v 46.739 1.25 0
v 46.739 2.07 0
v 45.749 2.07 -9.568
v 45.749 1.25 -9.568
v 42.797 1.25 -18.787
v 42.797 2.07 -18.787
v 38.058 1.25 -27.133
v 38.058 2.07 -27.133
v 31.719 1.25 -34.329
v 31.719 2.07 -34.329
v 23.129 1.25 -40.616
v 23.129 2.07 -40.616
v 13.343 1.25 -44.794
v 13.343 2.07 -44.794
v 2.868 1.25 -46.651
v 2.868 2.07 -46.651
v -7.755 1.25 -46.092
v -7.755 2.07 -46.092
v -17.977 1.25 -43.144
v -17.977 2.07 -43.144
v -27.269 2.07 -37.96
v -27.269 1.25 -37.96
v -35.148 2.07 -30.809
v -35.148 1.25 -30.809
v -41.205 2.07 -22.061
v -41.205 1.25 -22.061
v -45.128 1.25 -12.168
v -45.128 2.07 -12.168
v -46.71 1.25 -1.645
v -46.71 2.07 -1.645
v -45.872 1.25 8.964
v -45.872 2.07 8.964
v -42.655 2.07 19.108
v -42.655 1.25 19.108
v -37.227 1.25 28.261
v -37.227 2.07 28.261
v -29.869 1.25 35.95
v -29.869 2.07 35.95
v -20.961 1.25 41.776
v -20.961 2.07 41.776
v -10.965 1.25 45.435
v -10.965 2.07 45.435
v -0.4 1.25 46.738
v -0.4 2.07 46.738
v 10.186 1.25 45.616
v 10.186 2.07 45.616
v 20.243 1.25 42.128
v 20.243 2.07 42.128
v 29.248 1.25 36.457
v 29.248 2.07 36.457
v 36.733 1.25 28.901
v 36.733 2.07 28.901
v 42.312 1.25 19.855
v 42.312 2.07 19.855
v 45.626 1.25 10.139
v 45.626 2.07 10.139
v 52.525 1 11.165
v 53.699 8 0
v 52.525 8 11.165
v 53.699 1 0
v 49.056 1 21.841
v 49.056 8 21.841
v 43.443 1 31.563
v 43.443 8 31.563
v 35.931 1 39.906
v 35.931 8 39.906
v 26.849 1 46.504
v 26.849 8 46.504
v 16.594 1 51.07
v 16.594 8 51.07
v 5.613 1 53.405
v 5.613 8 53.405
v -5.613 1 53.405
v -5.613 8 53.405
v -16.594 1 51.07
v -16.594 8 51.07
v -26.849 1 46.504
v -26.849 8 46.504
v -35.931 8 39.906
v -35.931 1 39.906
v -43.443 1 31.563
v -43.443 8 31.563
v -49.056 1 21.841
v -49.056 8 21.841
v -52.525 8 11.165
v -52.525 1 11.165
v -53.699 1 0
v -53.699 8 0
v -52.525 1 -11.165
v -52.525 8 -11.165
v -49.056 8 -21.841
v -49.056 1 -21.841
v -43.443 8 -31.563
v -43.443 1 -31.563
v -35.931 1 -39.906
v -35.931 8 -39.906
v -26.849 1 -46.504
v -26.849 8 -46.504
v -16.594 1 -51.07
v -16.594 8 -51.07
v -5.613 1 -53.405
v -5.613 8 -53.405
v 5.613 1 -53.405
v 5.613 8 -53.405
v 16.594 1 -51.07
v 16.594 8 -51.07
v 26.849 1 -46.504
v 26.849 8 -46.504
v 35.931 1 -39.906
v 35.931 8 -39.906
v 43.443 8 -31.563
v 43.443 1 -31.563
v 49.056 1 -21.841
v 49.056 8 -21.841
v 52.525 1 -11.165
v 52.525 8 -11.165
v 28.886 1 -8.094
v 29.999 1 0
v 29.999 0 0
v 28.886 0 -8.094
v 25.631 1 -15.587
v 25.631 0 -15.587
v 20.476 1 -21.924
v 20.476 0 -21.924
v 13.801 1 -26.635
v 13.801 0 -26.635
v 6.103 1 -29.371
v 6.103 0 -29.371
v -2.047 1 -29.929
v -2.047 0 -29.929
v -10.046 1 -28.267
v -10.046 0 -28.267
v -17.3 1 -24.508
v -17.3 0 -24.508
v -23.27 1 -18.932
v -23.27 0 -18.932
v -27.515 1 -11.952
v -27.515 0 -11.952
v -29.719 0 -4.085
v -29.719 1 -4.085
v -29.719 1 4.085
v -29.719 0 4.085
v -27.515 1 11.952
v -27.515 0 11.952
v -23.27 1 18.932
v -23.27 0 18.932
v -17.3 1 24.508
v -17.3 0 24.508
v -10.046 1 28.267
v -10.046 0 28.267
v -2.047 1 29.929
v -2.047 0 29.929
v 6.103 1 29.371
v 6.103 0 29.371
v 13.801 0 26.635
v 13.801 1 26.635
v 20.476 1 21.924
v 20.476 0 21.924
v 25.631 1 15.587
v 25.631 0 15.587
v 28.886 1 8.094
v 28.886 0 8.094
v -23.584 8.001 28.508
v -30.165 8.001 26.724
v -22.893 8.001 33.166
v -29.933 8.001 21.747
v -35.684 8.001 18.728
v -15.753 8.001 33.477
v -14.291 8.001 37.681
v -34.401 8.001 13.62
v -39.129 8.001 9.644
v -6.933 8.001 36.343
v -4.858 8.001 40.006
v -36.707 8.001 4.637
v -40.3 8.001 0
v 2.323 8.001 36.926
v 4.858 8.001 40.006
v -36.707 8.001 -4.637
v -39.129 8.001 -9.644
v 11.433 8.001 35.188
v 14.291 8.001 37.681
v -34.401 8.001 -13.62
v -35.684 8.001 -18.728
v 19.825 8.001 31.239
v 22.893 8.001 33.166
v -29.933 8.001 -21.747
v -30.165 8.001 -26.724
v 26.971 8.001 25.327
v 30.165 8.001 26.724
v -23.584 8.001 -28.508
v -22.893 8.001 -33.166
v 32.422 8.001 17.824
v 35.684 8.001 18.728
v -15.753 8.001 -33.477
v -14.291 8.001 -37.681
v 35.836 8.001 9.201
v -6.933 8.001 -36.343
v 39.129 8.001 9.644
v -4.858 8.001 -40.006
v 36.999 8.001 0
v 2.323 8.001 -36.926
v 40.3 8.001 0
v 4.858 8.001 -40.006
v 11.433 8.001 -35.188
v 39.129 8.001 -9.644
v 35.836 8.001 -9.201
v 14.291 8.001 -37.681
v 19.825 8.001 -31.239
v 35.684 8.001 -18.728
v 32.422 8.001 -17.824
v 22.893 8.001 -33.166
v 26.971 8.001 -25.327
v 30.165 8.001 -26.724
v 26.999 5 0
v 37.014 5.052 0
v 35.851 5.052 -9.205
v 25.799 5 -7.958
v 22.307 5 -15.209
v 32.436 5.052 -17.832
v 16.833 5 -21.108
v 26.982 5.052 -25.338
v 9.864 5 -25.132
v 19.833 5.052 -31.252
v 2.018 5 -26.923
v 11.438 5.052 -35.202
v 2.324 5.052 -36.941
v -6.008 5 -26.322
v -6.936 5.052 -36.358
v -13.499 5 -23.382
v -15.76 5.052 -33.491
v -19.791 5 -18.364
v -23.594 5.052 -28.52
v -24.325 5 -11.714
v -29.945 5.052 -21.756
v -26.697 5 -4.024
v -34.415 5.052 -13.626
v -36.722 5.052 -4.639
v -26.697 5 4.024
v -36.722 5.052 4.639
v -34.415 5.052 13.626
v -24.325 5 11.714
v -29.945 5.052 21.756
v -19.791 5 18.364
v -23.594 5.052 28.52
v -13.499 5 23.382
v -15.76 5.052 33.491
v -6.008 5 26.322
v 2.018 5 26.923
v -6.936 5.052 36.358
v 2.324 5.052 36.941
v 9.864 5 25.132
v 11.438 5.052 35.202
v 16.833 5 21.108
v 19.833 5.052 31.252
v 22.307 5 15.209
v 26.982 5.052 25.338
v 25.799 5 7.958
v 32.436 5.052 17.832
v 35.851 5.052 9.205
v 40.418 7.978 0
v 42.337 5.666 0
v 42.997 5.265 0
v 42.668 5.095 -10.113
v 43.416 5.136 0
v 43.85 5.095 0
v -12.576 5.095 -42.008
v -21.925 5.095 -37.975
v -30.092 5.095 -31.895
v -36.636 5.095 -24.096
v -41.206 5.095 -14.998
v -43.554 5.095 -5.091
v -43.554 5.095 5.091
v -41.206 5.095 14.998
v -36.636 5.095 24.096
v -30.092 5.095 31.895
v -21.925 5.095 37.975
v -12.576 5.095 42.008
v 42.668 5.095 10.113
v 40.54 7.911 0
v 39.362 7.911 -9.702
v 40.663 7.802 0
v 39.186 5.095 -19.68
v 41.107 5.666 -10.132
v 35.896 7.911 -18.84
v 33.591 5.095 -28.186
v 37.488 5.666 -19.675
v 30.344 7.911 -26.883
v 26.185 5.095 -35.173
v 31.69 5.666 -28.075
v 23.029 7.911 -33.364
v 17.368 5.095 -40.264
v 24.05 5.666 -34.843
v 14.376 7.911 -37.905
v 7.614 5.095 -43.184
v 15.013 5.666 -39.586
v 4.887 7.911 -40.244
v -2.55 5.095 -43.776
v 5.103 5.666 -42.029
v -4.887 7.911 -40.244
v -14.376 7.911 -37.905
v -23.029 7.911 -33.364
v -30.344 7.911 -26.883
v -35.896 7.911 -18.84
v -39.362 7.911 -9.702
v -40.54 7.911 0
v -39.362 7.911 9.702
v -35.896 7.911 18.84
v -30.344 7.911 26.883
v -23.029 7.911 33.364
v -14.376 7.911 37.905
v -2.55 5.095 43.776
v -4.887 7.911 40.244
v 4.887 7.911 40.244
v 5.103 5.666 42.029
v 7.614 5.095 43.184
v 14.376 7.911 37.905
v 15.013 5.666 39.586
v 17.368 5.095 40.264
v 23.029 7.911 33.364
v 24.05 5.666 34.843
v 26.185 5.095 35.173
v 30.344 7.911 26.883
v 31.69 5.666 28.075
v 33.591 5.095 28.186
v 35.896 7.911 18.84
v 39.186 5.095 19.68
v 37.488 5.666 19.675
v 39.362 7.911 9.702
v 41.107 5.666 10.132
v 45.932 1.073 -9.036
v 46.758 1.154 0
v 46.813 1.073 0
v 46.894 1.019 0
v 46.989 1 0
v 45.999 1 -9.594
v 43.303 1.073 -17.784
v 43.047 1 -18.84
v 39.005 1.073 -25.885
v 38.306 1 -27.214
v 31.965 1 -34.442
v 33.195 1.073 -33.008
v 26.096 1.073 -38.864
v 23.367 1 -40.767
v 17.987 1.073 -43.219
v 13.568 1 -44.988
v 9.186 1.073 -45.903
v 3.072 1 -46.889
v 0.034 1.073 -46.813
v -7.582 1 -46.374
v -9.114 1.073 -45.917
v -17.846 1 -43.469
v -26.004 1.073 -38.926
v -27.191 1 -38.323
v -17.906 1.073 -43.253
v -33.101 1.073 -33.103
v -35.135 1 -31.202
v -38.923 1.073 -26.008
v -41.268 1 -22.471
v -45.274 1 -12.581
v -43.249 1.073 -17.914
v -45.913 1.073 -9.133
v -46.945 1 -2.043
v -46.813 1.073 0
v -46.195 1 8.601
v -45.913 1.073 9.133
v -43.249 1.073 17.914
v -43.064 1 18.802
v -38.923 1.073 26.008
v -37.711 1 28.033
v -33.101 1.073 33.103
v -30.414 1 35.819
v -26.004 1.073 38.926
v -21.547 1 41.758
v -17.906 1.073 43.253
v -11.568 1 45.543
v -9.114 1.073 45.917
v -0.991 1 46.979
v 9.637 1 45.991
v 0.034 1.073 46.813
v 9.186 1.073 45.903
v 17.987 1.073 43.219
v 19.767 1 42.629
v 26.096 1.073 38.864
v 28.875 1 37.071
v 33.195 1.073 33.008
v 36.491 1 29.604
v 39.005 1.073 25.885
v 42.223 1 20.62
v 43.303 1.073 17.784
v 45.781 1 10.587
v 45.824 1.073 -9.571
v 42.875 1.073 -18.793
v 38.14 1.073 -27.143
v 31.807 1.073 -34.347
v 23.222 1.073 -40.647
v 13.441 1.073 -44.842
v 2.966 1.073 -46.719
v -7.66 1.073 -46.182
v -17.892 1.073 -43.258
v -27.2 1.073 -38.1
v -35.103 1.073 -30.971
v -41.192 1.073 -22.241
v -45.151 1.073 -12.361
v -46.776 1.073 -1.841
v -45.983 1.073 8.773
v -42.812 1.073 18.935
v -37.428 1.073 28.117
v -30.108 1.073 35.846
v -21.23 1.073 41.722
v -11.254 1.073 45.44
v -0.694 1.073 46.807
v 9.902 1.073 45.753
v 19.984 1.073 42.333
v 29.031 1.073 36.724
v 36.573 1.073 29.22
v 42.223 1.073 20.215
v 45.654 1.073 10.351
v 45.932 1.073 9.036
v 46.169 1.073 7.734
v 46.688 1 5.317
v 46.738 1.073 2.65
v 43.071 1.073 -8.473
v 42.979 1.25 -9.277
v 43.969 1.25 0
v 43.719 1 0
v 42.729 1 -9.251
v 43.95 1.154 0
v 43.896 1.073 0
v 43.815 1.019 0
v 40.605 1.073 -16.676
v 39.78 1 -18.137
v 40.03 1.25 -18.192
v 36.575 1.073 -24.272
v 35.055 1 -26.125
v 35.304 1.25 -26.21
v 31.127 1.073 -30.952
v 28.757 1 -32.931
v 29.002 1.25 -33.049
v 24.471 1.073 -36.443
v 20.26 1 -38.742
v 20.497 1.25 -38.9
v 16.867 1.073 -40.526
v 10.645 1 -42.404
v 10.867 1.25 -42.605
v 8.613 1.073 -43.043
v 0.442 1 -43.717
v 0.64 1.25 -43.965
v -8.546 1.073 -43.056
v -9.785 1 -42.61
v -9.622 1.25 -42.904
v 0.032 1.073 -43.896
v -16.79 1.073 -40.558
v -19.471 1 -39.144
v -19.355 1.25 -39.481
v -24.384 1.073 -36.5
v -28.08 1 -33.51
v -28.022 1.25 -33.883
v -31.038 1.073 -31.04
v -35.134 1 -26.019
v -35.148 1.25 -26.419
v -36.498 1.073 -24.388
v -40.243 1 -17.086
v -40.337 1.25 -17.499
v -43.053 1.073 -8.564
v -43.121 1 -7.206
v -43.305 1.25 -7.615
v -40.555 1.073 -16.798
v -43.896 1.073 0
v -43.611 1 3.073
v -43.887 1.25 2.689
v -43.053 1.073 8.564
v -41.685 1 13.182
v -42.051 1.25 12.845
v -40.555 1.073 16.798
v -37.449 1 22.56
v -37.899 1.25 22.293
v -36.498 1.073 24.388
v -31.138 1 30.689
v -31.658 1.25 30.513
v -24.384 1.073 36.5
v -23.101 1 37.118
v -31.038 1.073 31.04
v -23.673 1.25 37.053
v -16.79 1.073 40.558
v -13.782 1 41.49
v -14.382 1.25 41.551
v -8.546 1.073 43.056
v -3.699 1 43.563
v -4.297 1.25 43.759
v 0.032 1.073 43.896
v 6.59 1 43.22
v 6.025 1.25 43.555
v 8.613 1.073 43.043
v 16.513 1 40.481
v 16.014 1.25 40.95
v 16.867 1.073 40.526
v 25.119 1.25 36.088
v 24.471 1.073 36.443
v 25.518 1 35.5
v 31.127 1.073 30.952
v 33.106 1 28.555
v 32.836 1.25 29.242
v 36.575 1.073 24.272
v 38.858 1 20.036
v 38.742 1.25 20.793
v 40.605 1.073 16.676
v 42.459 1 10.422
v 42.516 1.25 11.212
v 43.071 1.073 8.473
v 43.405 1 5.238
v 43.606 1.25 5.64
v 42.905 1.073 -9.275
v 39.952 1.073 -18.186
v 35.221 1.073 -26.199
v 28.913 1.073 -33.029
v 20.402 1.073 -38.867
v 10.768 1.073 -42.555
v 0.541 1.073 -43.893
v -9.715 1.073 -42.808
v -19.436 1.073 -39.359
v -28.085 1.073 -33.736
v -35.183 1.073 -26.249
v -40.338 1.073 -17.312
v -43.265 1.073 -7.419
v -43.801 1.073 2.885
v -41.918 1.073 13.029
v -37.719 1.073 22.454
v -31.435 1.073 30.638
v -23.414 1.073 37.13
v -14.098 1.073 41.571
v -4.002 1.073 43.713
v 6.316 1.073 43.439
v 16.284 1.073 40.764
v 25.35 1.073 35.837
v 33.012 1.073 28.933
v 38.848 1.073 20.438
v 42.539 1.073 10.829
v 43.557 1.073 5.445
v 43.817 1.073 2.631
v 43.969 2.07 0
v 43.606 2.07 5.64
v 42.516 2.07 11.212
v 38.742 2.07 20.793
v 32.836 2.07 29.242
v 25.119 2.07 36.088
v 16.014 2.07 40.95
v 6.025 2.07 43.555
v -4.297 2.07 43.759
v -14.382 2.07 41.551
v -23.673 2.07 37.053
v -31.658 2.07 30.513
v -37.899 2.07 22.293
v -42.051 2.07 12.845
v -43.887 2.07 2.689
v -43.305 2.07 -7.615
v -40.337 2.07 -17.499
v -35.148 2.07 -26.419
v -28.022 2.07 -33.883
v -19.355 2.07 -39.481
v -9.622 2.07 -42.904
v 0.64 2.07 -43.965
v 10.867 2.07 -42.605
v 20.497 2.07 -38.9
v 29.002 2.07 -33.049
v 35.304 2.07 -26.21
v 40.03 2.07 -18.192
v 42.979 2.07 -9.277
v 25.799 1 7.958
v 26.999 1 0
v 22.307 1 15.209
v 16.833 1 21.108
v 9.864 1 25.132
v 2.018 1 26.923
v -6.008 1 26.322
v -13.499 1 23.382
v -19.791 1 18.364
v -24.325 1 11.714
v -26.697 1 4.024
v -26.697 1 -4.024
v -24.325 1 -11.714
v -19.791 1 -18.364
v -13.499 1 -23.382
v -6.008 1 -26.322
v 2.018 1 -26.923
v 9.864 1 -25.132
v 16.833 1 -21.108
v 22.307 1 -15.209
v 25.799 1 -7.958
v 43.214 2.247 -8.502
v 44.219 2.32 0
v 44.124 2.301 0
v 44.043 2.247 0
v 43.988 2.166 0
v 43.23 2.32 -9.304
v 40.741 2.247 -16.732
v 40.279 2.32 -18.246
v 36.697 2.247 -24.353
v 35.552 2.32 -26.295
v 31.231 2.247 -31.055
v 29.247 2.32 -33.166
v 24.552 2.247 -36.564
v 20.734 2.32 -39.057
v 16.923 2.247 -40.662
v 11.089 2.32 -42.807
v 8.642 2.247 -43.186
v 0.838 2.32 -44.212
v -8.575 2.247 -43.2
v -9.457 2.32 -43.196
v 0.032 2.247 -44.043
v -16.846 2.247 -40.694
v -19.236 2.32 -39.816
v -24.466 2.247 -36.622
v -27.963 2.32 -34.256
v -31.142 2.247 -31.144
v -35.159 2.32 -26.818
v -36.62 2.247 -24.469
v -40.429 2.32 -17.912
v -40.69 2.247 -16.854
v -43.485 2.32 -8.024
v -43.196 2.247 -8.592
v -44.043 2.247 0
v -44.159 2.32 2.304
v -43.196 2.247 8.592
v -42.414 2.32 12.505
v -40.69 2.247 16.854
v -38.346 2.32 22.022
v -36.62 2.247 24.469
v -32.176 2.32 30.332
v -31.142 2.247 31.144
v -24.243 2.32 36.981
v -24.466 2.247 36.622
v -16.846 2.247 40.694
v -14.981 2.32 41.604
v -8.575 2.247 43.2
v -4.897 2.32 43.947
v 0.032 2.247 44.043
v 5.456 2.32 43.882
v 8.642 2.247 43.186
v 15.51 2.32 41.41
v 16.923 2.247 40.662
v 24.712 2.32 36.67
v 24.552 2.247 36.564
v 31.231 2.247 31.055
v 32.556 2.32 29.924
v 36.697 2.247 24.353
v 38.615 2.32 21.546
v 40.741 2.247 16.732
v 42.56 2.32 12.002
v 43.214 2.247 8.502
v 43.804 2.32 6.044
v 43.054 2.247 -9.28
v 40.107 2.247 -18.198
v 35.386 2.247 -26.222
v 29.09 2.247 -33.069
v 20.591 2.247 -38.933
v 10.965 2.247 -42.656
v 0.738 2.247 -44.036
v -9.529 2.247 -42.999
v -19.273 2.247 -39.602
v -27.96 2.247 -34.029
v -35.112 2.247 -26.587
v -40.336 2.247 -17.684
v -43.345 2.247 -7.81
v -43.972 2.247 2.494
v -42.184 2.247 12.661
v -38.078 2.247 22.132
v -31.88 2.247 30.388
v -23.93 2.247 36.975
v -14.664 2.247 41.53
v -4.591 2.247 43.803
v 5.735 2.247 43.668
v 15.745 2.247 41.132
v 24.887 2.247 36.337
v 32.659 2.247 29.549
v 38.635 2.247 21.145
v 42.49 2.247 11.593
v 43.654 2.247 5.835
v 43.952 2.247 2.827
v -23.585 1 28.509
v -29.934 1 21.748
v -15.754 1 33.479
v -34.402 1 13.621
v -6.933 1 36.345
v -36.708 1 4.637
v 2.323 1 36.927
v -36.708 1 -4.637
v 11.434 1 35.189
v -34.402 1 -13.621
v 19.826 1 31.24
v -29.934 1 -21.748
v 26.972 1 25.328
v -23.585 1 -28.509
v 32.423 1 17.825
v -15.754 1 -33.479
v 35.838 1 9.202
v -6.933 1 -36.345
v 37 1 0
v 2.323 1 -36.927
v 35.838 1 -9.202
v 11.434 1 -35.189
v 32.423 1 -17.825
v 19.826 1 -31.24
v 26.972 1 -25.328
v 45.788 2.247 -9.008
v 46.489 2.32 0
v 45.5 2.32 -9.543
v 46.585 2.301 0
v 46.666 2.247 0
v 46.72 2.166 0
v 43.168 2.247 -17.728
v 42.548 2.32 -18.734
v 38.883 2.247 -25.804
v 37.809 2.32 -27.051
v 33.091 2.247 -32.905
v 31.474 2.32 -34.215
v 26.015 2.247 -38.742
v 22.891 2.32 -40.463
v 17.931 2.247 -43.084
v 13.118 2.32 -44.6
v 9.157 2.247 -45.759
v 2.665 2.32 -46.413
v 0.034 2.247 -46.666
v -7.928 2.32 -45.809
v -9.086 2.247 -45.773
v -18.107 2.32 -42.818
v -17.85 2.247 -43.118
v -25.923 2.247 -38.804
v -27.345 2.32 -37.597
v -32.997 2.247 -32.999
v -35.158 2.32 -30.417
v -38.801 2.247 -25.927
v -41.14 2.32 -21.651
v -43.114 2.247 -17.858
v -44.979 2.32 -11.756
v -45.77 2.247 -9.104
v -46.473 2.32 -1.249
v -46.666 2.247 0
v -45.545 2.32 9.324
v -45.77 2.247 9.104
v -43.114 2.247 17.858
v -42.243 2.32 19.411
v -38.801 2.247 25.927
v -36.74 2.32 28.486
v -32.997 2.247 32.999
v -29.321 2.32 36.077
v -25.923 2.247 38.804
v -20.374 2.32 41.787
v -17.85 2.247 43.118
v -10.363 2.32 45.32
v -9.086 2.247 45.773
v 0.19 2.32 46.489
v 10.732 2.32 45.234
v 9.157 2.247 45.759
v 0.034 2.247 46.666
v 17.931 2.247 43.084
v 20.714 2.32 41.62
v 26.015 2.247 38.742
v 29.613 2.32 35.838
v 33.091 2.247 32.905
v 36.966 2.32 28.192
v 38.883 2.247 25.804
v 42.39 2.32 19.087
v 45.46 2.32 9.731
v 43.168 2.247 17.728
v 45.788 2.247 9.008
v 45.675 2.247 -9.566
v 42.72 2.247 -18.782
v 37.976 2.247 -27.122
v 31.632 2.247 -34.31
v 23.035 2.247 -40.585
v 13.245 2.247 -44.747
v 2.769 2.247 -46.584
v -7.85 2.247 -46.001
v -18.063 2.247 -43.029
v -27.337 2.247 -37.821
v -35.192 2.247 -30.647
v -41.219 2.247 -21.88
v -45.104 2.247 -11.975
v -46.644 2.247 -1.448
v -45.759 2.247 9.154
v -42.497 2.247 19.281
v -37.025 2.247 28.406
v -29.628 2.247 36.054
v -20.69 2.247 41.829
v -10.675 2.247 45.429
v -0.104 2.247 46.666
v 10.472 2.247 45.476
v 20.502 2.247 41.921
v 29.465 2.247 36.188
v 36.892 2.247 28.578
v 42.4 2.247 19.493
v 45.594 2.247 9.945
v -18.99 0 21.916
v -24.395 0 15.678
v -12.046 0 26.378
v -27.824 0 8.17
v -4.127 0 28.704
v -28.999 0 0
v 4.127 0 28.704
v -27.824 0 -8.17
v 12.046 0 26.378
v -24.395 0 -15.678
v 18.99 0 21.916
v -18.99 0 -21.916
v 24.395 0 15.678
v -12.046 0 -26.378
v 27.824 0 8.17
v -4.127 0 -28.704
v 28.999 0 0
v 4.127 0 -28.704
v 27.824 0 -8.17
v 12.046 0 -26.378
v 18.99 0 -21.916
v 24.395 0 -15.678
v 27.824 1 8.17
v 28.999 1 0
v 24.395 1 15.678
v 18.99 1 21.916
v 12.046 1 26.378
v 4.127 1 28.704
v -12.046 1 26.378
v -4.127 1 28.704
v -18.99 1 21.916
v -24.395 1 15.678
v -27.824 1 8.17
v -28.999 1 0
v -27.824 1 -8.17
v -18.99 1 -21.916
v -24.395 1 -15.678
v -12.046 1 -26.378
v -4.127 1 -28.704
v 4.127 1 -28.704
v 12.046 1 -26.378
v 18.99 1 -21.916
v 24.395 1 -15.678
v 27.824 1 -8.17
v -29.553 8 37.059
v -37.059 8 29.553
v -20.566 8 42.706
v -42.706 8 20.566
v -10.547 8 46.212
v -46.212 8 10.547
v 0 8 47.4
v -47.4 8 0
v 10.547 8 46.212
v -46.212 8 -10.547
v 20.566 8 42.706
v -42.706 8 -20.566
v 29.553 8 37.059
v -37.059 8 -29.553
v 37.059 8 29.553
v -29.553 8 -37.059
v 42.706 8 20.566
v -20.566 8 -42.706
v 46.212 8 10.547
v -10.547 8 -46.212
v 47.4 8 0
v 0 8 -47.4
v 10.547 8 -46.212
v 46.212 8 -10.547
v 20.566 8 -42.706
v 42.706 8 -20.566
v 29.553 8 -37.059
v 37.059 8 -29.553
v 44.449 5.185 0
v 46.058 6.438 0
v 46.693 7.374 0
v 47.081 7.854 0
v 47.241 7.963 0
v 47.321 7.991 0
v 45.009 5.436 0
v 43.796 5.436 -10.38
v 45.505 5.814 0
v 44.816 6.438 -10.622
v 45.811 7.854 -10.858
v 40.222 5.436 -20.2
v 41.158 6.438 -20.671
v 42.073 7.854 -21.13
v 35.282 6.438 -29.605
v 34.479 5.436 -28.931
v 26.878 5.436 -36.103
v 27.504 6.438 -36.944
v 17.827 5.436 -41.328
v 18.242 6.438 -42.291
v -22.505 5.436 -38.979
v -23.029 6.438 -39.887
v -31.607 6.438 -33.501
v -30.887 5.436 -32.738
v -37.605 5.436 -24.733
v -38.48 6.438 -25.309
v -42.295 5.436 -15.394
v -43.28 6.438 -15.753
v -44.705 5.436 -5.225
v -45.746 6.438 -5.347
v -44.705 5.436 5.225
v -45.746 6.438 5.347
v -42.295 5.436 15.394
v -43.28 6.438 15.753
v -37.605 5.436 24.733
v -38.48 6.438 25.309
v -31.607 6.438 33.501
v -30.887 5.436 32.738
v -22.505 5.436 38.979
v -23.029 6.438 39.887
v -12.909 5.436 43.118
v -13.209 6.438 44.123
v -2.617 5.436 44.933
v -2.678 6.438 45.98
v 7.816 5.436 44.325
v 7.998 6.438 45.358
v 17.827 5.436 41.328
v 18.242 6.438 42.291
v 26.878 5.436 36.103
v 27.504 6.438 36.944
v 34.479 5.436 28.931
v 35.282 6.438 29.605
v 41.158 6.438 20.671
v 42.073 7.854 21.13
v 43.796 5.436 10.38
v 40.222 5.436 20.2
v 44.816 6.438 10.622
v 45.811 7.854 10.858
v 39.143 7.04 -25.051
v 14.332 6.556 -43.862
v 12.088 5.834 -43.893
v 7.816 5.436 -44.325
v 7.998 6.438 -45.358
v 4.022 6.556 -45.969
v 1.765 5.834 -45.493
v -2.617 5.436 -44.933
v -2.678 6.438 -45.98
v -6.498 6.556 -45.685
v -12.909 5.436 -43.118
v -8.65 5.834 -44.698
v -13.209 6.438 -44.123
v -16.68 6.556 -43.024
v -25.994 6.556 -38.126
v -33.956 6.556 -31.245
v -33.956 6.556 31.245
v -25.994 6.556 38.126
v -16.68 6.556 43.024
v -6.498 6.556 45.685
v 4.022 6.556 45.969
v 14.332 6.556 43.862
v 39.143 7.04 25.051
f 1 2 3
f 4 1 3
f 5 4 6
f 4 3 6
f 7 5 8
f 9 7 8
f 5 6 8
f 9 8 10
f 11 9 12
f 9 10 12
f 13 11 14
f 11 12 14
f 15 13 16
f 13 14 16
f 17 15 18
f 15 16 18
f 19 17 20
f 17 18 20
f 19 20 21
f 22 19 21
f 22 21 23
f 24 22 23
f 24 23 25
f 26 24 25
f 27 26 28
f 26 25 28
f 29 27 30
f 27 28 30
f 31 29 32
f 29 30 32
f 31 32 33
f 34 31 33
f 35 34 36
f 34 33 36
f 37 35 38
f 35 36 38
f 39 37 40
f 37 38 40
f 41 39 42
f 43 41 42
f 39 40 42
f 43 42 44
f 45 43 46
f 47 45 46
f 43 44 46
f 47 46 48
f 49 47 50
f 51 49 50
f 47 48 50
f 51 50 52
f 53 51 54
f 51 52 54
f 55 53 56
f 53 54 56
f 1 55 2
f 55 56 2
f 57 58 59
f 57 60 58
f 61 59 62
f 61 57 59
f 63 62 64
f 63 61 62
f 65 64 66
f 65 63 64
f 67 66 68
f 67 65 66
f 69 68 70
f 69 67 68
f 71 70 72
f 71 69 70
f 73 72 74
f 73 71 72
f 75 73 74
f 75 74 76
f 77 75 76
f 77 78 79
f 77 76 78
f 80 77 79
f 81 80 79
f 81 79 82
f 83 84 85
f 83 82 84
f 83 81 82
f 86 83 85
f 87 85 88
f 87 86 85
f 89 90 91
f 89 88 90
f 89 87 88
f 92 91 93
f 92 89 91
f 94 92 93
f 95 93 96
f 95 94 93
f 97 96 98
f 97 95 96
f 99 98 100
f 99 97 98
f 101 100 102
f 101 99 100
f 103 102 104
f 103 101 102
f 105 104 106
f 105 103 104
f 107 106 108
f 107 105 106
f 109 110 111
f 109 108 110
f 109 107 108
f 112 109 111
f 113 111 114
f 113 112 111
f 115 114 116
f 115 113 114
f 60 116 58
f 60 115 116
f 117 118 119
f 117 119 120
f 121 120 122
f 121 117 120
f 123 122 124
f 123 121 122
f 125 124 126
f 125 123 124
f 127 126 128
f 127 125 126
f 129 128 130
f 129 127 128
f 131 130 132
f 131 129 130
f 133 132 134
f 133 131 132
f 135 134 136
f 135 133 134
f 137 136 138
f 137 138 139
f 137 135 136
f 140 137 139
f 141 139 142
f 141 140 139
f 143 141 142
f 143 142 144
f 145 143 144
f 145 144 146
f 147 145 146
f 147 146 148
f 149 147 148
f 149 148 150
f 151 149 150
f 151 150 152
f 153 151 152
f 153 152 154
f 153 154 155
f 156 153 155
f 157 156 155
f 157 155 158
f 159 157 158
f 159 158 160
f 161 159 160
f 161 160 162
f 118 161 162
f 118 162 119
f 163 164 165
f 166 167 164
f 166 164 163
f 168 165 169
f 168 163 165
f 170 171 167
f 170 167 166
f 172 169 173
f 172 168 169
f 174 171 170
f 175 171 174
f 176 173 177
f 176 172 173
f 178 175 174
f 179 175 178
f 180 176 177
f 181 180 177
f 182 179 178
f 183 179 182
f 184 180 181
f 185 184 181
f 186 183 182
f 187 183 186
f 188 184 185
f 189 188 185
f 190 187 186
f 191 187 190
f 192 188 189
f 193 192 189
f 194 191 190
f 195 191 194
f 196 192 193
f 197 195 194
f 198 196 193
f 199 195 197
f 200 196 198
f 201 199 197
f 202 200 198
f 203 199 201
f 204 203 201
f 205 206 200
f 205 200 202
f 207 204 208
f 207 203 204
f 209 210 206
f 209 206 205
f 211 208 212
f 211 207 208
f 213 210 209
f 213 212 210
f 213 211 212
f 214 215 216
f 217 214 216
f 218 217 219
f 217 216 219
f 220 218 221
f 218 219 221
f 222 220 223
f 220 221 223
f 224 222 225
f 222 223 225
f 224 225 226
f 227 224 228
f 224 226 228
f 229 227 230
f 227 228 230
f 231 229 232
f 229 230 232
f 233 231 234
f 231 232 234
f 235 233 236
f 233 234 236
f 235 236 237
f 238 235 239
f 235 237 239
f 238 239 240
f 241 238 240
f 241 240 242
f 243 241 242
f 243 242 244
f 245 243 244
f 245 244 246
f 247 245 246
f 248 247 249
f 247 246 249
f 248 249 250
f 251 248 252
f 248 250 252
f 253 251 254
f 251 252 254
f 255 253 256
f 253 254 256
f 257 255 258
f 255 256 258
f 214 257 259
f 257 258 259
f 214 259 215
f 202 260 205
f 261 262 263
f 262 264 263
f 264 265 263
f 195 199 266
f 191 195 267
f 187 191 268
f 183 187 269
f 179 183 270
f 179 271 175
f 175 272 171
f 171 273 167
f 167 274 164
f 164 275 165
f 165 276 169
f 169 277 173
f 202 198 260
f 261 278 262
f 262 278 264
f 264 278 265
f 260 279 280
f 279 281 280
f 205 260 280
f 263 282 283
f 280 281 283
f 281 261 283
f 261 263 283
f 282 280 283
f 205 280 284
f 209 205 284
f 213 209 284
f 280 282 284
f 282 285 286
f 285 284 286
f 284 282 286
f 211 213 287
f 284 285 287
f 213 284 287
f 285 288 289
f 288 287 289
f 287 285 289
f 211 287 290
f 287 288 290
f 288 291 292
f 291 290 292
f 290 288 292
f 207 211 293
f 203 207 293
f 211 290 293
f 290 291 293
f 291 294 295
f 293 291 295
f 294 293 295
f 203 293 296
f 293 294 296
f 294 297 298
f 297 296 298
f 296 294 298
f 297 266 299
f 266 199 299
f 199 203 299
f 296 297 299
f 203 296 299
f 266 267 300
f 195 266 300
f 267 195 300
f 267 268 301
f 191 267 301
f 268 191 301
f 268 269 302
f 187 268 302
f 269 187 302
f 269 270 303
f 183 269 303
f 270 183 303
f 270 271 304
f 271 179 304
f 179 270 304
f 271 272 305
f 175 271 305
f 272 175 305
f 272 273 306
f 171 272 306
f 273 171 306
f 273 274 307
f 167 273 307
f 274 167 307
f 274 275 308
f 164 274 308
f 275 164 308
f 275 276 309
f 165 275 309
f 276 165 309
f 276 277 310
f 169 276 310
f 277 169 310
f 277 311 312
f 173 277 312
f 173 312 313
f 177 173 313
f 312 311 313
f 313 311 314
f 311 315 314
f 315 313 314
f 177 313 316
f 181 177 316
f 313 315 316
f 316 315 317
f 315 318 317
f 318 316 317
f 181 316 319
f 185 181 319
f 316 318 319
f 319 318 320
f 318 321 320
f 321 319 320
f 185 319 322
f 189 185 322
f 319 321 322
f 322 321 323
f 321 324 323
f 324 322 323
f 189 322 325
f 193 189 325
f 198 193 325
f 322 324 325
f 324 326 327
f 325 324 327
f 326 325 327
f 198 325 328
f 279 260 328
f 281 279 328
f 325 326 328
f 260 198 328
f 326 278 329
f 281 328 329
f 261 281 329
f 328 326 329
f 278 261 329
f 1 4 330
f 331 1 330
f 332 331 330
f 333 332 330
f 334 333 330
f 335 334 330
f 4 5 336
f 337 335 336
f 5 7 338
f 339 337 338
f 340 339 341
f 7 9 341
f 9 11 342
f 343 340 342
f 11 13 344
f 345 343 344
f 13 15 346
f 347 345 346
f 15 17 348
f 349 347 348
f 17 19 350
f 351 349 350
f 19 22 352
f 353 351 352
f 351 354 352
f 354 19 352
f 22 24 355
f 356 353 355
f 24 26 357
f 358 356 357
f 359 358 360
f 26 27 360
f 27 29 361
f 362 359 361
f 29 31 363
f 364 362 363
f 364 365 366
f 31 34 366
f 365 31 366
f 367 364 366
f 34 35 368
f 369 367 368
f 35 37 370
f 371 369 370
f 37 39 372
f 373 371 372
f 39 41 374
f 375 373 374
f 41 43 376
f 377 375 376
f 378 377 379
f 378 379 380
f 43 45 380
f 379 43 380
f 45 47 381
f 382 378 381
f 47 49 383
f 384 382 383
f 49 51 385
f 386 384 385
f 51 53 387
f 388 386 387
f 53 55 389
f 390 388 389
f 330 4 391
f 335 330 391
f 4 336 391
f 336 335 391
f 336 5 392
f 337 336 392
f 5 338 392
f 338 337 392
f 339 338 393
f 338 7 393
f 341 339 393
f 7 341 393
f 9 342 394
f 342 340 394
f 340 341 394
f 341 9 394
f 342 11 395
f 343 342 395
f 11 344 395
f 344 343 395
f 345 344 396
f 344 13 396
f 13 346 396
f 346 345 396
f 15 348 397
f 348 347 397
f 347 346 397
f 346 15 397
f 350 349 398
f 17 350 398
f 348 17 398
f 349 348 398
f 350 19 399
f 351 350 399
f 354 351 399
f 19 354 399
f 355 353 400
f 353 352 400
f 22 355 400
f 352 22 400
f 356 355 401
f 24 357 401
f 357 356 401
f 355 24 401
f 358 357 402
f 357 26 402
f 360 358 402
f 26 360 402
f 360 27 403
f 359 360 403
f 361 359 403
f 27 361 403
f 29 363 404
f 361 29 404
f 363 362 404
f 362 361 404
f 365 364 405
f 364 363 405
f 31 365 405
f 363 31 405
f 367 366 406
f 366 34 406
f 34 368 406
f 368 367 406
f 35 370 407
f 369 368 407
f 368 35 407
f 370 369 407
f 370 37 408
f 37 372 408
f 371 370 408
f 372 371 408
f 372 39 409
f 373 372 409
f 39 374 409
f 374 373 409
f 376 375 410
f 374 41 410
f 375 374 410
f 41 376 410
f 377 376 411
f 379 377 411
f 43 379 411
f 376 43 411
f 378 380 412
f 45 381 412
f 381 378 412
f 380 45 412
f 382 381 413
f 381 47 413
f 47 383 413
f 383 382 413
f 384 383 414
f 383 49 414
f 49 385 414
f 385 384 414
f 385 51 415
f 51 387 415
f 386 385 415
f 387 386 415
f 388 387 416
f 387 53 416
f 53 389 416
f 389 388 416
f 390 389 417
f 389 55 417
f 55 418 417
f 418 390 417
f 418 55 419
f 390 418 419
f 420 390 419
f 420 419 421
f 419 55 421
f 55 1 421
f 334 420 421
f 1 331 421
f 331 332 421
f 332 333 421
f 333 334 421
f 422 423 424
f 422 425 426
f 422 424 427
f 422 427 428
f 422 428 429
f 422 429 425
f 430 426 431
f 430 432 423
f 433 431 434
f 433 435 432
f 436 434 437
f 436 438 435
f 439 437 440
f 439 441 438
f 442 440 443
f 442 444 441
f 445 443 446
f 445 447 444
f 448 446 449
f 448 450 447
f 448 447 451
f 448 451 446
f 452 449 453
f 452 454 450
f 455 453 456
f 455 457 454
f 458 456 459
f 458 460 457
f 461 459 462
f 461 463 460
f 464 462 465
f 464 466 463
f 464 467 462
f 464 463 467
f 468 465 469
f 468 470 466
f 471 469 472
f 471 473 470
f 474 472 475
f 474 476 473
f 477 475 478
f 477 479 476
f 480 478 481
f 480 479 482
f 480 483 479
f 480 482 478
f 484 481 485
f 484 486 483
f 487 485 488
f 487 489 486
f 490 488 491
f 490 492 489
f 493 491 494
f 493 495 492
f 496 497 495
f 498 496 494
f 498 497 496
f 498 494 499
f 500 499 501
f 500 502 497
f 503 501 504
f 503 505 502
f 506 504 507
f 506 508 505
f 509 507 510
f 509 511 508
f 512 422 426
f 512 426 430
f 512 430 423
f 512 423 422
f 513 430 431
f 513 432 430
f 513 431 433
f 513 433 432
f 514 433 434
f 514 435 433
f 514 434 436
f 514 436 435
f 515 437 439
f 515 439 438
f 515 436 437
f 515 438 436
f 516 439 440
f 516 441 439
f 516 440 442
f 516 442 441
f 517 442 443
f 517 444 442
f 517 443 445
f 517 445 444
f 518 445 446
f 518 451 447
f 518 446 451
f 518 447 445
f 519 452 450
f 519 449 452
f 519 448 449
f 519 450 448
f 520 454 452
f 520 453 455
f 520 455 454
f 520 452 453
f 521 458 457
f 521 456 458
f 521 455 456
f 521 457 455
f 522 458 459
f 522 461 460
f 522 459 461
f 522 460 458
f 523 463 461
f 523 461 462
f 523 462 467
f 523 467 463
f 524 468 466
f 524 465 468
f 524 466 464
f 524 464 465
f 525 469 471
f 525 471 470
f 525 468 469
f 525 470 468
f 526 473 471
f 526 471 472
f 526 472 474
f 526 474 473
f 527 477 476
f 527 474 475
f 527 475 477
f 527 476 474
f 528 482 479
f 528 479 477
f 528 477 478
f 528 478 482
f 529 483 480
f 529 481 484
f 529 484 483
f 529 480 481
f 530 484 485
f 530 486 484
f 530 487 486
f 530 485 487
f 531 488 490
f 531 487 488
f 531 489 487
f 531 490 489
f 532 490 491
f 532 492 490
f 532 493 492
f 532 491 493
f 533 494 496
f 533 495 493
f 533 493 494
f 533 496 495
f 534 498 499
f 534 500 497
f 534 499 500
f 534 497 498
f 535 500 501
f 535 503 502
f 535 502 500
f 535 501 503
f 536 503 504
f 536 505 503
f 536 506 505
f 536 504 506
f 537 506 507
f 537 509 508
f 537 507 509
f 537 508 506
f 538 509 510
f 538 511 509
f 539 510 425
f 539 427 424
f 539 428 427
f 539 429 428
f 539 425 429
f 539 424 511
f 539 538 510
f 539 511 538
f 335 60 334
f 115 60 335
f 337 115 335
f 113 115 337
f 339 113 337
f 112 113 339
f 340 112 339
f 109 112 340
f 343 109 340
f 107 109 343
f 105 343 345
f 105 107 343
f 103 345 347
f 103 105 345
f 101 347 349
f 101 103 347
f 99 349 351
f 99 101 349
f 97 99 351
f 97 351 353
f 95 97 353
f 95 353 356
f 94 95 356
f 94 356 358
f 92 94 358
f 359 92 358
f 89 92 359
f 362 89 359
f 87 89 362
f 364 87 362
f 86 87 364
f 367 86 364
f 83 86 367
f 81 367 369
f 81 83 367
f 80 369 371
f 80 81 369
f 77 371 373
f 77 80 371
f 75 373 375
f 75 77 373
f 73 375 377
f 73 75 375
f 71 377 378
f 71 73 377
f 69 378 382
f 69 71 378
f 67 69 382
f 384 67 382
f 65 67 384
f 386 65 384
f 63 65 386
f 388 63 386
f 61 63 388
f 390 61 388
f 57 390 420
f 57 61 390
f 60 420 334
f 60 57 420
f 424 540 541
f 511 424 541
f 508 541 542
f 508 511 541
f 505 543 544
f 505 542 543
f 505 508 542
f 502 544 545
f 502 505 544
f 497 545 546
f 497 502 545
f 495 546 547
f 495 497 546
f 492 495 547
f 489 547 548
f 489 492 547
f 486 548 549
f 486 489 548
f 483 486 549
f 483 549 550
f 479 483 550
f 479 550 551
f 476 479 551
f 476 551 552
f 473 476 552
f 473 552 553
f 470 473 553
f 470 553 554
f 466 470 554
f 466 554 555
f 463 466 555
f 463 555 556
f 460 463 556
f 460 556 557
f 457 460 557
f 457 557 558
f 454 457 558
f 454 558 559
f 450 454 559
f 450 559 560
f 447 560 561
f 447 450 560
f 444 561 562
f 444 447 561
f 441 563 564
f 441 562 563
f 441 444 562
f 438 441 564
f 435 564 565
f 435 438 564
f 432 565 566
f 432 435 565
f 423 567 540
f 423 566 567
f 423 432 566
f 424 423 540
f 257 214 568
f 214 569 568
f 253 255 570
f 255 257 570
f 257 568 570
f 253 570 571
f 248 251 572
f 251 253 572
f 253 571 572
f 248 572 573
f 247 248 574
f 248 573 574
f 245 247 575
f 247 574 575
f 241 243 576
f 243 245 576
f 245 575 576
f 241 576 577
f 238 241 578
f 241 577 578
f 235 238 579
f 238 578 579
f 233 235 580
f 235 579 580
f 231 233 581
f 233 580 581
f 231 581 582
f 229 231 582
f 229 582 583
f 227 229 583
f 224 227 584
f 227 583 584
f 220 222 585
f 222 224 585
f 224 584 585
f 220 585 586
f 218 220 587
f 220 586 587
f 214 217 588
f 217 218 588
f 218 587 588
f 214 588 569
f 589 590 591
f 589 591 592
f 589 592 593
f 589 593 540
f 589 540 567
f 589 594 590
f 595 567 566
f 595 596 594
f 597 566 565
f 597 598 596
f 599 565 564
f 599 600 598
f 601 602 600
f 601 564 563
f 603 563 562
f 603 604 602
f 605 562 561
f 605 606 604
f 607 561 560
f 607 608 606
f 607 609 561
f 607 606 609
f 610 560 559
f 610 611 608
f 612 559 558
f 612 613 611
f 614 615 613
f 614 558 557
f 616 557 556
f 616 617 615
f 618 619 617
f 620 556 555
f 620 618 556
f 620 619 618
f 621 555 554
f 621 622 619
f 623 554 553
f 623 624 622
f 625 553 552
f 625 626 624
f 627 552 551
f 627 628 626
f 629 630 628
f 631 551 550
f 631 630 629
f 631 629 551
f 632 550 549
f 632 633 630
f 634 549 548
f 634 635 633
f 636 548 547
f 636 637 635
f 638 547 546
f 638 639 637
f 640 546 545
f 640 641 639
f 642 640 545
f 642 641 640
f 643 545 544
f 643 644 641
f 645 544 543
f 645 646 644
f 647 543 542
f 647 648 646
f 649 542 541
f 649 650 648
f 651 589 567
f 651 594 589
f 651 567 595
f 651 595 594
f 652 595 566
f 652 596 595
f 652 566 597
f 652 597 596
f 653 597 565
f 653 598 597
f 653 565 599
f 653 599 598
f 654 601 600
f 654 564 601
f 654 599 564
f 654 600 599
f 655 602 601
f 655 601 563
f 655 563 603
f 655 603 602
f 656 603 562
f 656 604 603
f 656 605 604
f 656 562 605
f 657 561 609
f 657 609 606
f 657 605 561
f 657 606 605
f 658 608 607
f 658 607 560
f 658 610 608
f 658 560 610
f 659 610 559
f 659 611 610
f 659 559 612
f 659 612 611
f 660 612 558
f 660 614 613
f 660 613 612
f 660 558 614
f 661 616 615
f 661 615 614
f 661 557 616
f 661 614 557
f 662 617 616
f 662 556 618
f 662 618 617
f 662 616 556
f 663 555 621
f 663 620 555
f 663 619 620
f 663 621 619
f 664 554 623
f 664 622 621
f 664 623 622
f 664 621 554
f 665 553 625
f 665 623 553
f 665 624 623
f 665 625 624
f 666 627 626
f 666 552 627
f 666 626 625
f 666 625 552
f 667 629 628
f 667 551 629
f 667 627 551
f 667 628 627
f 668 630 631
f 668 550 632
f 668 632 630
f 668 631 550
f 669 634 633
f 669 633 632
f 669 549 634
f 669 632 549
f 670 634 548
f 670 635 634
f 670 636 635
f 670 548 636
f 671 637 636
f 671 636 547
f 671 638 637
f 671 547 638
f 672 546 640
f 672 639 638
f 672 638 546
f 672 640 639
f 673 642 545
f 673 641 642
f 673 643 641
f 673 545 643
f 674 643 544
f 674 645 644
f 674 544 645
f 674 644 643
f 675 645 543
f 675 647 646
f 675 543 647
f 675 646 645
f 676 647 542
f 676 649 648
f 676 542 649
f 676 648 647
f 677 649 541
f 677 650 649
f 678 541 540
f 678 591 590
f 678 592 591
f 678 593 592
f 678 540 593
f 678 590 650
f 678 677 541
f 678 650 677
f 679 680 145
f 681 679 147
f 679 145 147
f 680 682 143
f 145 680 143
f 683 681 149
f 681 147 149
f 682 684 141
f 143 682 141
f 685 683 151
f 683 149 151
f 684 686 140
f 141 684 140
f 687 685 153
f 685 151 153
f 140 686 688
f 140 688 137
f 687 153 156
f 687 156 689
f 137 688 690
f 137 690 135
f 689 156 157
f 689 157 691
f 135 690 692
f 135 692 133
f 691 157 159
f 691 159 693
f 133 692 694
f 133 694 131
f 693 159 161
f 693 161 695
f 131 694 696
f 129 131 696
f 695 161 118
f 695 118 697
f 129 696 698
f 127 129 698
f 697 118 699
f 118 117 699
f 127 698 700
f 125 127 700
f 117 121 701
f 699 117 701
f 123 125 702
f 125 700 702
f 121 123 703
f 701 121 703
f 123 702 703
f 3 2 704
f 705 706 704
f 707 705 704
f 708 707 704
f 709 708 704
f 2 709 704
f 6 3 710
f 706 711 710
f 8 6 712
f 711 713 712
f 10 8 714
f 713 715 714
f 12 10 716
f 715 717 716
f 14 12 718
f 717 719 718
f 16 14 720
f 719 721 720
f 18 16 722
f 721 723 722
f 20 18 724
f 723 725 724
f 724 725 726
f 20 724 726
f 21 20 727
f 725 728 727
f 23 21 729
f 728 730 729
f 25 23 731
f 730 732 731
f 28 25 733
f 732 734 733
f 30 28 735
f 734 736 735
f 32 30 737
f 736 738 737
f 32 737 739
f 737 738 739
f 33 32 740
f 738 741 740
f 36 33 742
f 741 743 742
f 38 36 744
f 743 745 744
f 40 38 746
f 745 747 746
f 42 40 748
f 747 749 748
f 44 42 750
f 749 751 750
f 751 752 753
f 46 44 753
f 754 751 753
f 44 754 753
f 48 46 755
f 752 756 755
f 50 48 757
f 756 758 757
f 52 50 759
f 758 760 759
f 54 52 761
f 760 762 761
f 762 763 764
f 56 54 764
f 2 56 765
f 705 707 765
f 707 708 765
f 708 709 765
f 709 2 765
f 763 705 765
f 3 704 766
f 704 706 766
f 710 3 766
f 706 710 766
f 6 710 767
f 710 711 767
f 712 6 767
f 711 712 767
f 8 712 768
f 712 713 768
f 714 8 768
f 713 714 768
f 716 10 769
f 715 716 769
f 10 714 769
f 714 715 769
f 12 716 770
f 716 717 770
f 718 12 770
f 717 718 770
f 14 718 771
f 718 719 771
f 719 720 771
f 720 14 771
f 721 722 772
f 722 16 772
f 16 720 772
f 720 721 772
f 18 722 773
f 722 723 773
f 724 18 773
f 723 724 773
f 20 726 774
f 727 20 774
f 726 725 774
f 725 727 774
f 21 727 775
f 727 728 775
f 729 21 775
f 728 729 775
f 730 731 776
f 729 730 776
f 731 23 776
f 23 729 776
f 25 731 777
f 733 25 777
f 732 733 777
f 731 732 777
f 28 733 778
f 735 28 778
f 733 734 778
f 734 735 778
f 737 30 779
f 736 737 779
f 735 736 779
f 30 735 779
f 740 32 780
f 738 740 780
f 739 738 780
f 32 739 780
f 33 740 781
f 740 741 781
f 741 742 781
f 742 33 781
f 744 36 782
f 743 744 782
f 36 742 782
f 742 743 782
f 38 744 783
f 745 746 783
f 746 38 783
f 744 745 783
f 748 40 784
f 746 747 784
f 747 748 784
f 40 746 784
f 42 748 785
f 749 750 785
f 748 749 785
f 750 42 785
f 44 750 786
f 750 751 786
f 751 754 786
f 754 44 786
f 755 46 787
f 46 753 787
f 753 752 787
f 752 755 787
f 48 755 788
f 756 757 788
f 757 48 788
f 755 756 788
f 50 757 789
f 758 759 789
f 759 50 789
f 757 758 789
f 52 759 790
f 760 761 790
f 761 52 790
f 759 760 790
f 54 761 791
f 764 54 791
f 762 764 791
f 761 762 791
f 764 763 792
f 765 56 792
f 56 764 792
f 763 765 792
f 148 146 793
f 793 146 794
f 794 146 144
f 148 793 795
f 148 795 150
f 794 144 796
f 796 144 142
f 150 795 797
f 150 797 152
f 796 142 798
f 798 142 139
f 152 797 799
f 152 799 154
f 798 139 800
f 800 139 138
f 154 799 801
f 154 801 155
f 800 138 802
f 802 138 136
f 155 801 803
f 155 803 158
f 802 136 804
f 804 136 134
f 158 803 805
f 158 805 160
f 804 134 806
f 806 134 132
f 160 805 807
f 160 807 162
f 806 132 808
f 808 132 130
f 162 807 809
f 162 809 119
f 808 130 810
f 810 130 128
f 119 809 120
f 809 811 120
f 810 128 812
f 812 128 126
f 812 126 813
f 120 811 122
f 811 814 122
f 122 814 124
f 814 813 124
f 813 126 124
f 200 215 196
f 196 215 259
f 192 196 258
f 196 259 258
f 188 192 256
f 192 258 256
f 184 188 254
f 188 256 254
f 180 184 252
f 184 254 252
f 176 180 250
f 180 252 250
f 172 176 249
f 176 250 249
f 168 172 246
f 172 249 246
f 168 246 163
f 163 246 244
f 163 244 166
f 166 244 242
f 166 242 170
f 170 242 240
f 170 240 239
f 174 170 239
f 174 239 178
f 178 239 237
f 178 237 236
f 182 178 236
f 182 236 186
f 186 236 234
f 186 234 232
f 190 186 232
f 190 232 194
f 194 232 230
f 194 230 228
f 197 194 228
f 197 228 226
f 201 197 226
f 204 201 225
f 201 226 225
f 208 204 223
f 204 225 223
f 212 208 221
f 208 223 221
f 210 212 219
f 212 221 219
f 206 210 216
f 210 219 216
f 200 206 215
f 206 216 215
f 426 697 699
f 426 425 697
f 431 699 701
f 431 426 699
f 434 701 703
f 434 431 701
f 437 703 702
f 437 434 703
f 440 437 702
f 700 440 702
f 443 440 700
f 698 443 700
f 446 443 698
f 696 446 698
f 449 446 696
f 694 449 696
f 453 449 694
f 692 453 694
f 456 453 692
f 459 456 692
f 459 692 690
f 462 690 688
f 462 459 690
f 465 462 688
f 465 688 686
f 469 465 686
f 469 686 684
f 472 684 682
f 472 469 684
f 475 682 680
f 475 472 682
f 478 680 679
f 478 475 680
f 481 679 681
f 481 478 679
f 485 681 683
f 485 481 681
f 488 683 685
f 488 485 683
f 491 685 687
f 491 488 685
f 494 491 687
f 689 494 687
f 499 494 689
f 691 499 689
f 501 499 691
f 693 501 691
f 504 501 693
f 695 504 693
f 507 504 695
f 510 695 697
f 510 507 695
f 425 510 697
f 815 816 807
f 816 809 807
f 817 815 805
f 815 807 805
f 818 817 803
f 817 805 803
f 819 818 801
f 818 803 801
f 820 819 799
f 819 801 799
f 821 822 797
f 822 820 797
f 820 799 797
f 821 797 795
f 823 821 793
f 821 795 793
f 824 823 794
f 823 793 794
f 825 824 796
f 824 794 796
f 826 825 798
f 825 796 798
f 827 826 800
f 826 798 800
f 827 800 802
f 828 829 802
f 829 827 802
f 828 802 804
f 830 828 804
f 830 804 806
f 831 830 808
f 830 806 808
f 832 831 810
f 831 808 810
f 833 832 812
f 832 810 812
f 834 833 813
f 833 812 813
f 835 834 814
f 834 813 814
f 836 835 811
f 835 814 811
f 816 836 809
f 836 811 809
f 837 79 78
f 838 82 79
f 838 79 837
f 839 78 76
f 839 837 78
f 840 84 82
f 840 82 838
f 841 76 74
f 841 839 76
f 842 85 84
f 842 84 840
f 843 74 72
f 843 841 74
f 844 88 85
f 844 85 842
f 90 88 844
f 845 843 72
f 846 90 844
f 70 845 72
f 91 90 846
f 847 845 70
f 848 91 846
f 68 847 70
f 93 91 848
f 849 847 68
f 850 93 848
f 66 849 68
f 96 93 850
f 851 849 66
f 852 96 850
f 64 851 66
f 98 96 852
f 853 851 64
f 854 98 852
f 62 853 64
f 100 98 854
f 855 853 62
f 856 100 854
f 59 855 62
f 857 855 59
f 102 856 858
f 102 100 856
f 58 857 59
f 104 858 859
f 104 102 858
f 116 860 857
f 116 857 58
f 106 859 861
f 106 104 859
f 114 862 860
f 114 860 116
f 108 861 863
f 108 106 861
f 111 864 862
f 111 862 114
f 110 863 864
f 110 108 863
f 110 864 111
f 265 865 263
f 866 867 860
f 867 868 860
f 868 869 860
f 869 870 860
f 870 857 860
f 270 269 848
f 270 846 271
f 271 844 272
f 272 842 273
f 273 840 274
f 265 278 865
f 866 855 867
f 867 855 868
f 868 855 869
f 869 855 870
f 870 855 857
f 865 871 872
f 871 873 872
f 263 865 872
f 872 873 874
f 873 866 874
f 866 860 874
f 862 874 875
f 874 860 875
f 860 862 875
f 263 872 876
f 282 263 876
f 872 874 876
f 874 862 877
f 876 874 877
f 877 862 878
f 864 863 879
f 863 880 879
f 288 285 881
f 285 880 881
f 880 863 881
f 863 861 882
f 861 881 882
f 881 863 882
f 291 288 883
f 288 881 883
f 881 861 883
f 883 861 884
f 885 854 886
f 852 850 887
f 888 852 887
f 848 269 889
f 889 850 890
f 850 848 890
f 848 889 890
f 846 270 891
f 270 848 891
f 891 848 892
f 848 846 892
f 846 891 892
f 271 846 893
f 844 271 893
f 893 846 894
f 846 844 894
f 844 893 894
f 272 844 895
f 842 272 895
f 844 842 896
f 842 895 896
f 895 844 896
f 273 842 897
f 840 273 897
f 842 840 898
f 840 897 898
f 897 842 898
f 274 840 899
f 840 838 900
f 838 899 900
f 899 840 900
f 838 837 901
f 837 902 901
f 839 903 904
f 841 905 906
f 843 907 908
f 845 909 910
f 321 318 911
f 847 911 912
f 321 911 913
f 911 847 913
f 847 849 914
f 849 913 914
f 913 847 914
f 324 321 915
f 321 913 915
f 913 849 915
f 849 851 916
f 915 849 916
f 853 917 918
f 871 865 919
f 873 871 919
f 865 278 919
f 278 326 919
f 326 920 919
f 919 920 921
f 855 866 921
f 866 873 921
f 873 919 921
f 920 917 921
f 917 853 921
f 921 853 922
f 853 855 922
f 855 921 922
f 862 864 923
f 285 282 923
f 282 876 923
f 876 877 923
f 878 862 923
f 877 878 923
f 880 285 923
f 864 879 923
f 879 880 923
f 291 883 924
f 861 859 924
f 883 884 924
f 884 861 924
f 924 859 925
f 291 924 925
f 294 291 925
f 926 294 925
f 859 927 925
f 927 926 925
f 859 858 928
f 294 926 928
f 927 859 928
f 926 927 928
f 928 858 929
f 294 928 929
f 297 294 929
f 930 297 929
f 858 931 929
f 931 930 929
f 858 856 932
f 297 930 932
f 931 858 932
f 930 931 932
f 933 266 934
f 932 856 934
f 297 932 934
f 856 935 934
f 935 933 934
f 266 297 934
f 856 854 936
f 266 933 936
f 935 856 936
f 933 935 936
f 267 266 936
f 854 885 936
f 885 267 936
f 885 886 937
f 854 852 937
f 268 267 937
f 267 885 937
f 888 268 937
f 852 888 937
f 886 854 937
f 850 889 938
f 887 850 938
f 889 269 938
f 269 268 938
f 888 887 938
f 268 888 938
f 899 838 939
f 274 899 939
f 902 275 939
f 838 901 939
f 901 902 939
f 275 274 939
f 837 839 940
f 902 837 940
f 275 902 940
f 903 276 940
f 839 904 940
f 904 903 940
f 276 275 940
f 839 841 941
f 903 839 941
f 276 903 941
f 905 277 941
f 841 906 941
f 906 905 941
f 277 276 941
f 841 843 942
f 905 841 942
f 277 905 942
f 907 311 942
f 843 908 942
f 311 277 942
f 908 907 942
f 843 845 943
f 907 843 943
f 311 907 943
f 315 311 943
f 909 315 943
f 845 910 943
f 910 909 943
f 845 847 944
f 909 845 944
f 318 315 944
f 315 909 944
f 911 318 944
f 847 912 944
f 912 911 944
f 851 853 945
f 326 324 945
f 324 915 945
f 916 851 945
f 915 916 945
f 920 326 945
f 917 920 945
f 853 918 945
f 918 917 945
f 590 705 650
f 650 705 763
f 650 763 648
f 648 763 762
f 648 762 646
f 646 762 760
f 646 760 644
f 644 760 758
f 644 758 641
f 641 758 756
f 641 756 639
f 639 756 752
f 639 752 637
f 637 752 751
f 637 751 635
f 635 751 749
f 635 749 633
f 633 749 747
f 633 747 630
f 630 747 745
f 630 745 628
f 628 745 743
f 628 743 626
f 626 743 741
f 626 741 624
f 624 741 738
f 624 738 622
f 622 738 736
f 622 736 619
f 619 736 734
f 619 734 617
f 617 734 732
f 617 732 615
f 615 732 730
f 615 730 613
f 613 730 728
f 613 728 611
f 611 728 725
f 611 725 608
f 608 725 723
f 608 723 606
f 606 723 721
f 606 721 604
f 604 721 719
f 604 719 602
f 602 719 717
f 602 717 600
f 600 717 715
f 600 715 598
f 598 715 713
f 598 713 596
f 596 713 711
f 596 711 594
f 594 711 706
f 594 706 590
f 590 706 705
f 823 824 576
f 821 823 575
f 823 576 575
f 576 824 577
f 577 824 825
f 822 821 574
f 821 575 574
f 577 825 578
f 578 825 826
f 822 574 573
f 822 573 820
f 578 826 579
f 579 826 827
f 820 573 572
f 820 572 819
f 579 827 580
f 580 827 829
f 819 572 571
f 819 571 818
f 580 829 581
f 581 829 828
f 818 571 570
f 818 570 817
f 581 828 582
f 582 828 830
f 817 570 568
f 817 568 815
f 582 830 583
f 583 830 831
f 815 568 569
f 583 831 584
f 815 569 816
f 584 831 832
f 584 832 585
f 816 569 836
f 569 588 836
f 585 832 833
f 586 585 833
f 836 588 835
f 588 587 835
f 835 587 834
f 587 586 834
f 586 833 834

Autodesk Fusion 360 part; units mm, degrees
sketch "Sketch1" plane through (0, 0, 0) normal (0, 0, 1) x (1, 0, 0)
  spline S0 degree 5 poles (40.3, 8.0005) (40.3854, 8.0005) (40.5575, 7.9418) (40.8197, 7.6776) (41.2001, 7.0315) (41.8406, 6.0459) (42.7193, 5.2457) (43.8506, 4.9398) (44.9792, 5.2641) (45.8516, 6.0676) (46.4866, 7.0454) (46.8672, 7.6822) (47.134, 7.9422) (47.3114, 8) (47.4, 8) knots 0 0 0 0 0 0 0.1 0.2 0.3 0.4 0.5 0.6 0.7 0.8 0.9 1 1 1 1 1 1
  line L0 (40.3, 8.0005) -> (36.9987, 8.0005)
  line L1 (47.4, 8) -> (53.6987, 8)
  line L2 (47.1403, 8) -> (47.6598, 8)
  line L3 (40.0497, 8.0005) -> (40.5503, 8.0005)
  line L4 (53.6987, 8) -> (53.6987, 1.0001)
  line L5 (43.2, 5.0899) -> (44.5, 5.1)
  line L6 (46.7394, 0.9997) -> (46.7394, 2.3197)
  line L7 (46.7394, 2.3197) -> (43.9694, 2.3205)
  line L8 (43.9694, 2.3205) -> (43.9694, 1.0001)
  line L9 (37, 1) -> (43.9694, 1.0001)
  line L10 (46.7394, 0.9997) -> (53.6987, 1.0001)
  line L11 (36.9987, 8.0005) -> (37.0139, 5.0519)
  line L12 (37.0139, 5.0519) -> (26.9987, 5.0003)
  line L13 (26.9987, 5.0003) -> (26.9987, 1)
  line L14 (26.9987, 1) -> (28.9987, 1)
  line L15 (28.9987, 1) -> (28.9987, 0)
  line L16 (28.9987, 0) -> (29.9987, 0)
  line L17 (29.9987, 0) -> (29.9987, 1)
  line L18 (29.9987, 1) -> (37, 1)
  point P0 (43.85, 5.095)
  dimension "d4" = 16.7
  dimension "d19" = 1.32
  dimension "d20" = 2.77
  dimension "d30" = 2
  dimension "d31" = 1
  dimension "d32" = 1
revolve "Revolve1" add sketch "Sketch1" angle 360 about axis through (0, 1.75, 0) along (0, 1, 0)
fillet "Fillet1" radius 0.25 1 edges at (-40.9938, 2.3205, -15.9)
fillet "Fillet2" radius 0.25 1 edges at (-43.5764, 2.3197, -16.9017)
fillet "Fillet3" radius 0.25 1 edges at (-40.9938, 1.0001, -15.9)
fillet "Fillet4" radius 0.25 1 edges at (-43.5764, 0.9997, -16.9017)
